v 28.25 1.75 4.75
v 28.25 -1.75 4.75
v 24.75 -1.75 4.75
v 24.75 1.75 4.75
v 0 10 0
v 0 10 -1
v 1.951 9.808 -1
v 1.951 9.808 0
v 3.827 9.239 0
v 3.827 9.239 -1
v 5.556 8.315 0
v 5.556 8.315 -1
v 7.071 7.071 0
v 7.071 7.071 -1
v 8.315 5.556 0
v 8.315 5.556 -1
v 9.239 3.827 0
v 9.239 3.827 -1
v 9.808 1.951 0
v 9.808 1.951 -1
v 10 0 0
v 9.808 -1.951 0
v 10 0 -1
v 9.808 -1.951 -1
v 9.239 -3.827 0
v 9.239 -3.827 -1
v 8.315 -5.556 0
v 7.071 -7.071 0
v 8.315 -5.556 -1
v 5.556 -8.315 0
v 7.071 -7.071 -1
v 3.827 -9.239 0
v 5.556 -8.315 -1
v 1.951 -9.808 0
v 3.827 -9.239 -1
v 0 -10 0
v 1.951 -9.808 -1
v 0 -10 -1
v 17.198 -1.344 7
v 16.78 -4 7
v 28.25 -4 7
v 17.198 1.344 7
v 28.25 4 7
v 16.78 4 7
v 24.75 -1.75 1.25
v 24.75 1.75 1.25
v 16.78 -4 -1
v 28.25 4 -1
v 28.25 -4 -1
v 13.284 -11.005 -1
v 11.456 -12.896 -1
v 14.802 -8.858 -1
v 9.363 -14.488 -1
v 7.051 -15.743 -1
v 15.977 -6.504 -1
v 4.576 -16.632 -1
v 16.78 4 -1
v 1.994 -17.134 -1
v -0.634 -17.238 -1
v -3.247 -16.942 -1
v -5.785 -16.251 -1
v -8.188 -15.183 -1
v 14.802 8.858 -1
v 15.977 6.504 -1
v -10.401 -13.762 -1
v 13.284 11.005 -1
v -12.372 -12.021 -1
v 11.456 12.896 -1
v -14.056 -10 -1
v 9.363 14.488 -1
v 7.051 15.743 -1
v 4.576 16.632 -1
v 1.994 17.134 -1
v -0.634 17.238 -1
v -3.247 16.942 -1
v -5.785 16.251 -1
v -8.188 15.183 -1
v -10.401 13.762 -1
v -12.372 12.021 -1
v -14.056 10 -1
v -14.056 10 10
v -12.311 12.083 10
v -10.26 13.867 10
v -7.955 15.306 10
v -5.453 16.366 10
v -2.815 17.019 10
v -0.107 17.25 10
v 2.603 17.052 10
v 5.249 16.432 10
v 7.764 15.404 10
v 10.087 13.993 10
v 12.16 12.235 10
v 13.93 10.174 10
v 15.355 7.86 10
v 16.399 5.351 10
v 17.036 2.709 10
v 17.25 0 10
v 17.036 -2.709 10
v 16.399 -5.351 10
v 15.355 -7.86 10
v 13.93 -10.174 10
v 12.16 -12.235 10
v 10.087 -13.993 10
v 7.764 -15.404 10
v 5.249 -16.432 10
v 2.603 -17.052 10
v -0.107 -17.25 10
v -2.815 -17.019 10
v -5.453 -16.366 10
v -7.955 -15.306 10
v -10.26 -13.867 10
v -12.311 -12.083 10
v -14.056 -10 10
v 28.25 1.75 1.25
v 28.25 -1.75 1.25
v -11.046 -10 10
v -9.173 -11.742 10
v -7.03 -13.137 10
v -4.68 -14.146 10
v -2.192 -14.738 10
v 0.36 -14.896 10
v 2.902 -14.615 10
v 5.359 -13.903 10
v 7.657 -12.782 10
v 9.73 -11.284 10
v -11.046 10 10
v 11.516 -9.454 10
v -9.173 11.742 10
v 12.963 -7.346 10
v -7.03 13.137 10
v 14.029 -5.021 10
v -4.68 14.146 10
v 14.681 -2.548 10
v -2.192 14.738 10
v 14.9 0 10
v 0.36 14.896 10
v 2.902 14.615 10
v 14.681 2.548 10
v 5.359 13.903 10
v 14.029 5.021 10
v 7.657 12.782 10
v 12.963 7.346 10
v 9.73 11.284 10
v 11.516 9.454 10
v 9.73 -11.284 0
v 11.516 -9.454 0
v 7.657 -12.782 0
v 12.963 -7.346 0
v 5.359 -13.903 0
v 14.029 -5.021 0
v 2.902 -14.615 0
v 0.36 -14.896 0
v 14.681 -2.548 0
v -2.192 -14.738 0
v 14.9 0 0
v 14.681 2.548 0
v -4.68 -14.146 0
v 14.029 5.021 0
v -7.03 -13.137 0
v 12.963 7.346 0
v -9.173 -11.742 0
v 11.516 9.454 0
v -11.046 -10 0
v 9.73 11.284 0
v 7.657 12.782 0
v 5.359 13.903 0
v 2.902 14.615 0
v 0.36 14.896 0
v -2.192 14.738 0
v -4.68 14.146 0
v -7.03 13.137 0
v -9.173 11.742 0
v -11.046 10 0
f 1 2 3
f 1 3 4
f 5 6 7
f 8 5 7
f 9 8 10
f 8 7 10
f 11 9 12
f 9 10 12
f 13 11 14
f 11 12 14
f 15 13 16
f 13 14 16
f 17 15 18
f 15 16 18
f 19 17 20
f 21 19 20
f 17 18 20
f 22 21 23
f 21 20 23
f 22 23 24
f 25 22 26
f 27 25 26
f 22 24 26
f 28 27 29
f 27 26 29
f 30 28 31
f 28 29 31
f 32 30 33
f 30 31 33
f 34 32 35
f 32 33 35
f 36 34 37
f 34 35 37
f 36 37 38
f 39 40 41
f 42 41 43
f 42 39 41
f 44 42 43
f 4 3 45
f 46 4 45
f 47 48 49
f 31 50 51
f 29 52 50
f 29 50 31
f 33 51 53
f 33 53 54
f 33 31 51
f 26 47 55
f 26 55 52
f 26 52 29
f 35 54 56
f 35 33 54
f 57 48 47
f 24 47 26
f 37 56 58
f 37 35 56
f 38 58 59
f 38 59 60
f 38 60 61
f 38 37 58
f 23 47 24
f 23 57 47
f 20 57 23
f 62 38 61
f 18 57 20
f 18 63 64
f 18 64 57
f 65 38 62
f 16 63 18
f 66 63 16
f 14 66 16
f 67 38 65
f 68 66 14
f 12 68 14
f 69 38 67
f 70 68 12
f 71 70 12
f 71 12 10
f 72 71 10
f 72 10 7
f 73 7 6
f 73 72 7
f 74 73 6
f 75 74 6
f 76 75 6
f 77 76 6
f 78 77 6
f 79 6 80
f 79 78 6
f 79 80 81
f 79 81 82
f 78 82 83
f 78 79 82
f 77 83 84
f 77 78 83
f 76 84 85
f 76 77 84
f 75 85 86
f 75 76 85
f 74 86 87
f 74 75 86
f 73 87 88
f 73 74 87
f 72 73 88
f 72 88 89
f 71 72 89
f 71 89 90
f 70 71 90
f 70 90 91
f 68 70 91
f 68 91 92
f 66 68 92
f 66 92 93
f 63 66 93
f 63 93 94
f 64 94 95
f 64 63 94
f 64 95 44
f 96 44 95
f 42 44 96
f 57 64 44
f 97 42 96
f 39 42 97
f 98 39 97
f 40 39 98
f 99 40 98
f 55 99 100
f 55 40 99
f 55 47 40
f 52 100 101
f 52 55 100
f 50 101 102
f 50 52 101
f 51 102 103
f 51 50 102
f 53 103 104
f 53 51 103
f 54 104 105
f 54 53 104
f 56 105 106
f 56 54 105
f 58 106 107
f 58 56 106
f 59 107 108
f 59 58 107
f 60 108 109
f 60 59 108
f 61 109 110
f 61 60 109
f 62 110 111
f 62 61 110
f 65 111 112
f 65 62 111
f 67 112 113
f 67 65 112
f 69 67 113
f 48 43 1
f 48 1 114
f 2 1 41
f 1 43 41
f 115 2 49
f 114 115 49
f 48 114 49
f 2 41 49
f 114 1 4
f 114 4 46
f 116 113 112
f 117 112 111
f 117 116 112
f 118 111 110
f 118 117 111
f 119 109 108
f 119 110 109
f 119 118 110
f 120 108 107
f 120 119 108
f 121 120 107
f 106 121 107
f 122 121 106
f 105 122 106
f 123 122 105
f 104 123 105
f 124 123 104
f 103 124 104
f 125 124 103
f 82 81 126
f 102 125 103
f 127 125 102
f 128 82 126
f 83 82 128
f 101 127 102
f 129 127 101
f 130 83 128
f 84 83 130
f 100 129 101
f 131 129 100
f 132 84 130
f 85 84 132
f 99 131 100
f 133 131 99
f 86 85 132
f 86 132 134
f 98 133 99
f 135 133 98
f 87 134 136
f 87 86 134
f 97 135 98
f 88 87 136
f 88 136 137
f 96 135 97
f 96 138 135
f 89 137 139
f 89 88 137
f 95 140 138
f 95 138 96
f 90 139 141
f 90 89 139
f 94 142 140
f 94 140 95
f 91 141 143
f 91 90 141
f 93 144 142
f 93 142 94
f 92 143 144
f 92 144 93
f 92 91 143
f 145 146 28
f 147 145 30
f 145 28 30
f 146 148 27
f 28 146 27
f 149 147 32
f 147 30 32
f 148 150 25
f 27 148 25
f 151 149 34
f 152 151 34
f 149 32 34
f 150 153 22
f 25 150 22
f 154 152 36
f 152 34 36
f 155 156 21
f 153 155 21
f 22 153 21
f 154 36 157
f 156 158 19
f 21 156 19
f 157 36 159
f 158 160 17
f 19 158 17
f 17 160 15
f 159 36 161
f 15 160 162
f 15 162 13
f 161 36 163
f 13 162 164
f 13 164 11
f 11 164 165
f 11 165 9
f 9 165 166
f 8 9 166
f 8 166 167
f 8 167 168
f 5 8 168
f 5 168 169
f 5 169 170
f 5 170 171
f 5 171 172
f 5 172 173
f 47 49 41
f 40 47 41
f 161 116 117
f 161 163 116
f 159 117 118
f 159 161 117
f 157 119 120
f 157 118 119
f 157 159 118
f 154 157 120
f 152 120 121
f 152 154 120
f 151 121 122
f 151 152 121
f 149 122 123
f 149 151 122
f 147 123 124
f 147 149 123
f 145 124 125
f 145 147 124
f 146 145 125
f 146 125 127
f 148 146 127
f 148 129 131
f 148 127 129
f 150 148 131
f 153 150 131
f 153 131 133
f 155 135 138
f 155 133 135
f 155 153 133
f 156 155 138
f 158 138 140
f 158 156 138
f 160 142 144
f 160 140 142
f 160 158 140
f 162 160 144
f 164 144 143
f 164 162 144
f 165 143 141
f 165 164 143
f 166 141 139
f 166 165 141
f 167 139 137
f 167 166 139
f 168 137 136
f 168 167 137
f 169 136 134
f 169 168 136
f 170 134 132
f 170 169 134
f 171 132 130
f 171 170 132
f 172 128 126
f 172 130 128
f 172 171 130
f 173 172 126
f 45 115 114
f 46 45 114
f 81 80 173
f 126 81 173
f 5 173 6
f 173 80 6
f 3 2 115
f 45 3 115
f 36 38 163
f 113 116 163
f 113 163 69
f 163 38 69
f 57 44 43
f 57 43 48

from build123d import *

# Parameters (mm, degrees)
SKETCH1_R                = 17.25
SKETCH1_R_2              = 14.9
BOSS_EXTRUDE1_DEPTH      = 10
BOSS_EXTRUDE3_START      = 1
SKETCH2_R                = 17.25
SKETCH2_R_2              = 10
BOSS_EXTRUDE3_DEPTH      = 1
SKETCH3_R                = 10
CUT_EXTRUDE1_DEPTH       = 27.760511953
BOSS_EXTRUDE4_DEPTH      = 11
BOSS_EXTRUDE4_DEPTH_BACK = 1.5
SKETCH4_W                = 3.5
SKETCH4_H                = 3.5
CUT_EXTRUDE2_DEPTH       = 3.5


with BuildPart() as part:
    # Sketch1 → Boss-Extrude1 (new body)
    with BuildSketch(Plane.XY):
        Circle(SKETCH1_R)
        Circle(SKETCH1_R_2, mode=Mode.SUBTRACT)
    extrude(amount=BOSS_EXTRUDE1_DEPTH)

    # Sketch2 → Boss-Extrude3 (add)
    with BuildSketch(Plane(origin=(0, 0, 0), x_dir=(-1, 0, 0), z_dir=(0, 0, -1)).offset(BOSS_EXTRUDE3_START)):
        Circle(SKETCH2_R)
        Circle(SKETCH2_R_2, mode=Mode.SUBTRACT)
    extrude(amount=-BOSS_EXTRUDE3_DEPTH)

    # Sketch3 → Cut-Extrude1 (cut, through all)
    with BuildSketch(Plane(origin=(0, 0, -1), x_dir=(-1, 0, 0), z_dir=(0, 0, -1))):
        Circle(SKETCH3_R)
        with BuildLine():
            Line((14.055692797, 10), (0, 10))
            ThreePointArc((0, 10), (7.071067812, 7.071067812), (10, 0))
            ThreePointArc((10, 0), (7.071067812, -7.071067812), (0, -10))
            Line((0, -10), (14.055692797, -10))
            ThreePointArc((14.055692797, -10), (16.432029709, -5.248895086), (17.25, 0))
            ThreePointArc((17.25, 0), (16.432029709, 5.248895086), (14.055692797, 10))
        make_face()
    extrude(amount=-CUT_EXTRUDE1_DEPTH, mode=Mode.SUBTRACT)

    # 3DSketch1 → Boss-Extrude4 (add, two sides: drawn at the far end of the back side and taken through both)
    with BuildSketch(Plane(origin=(17.25, 0, -1), x_dir=(0, 0.4472135954999581, 0.8944271909999159), z_dir=(1, 0, 0)).offset(-BOSS_EXTRUDE4_DEPTH_BACK)):
        Polygon((0, 0), (-1.788854382, 3.577708764), (5.366563146, 7.155417528), (8.94427191, 0), (1.788854382, -3.577708764), align=None)
    extrude(amount=BOSS_EXTRUDE4_DEPTH + BOSS_EXTRUDE4_DEPTH_BACK)

    # Sketch4 → Cut-Extrude2 (cut)
    with BuildSketch(Plane(origin=(28.25, 0, 0), x_dir=(0, 0, -1), z_dir=(1, 0, 0))):
        with Locations((-3, 0)):
            Rectangle(SKETCH4_W, SKETCH4_H)
    extrude(amount=-CUT_EXTRUDE2_DEPTH, mode=Mode.SUBTRACT)


solid = part.part
